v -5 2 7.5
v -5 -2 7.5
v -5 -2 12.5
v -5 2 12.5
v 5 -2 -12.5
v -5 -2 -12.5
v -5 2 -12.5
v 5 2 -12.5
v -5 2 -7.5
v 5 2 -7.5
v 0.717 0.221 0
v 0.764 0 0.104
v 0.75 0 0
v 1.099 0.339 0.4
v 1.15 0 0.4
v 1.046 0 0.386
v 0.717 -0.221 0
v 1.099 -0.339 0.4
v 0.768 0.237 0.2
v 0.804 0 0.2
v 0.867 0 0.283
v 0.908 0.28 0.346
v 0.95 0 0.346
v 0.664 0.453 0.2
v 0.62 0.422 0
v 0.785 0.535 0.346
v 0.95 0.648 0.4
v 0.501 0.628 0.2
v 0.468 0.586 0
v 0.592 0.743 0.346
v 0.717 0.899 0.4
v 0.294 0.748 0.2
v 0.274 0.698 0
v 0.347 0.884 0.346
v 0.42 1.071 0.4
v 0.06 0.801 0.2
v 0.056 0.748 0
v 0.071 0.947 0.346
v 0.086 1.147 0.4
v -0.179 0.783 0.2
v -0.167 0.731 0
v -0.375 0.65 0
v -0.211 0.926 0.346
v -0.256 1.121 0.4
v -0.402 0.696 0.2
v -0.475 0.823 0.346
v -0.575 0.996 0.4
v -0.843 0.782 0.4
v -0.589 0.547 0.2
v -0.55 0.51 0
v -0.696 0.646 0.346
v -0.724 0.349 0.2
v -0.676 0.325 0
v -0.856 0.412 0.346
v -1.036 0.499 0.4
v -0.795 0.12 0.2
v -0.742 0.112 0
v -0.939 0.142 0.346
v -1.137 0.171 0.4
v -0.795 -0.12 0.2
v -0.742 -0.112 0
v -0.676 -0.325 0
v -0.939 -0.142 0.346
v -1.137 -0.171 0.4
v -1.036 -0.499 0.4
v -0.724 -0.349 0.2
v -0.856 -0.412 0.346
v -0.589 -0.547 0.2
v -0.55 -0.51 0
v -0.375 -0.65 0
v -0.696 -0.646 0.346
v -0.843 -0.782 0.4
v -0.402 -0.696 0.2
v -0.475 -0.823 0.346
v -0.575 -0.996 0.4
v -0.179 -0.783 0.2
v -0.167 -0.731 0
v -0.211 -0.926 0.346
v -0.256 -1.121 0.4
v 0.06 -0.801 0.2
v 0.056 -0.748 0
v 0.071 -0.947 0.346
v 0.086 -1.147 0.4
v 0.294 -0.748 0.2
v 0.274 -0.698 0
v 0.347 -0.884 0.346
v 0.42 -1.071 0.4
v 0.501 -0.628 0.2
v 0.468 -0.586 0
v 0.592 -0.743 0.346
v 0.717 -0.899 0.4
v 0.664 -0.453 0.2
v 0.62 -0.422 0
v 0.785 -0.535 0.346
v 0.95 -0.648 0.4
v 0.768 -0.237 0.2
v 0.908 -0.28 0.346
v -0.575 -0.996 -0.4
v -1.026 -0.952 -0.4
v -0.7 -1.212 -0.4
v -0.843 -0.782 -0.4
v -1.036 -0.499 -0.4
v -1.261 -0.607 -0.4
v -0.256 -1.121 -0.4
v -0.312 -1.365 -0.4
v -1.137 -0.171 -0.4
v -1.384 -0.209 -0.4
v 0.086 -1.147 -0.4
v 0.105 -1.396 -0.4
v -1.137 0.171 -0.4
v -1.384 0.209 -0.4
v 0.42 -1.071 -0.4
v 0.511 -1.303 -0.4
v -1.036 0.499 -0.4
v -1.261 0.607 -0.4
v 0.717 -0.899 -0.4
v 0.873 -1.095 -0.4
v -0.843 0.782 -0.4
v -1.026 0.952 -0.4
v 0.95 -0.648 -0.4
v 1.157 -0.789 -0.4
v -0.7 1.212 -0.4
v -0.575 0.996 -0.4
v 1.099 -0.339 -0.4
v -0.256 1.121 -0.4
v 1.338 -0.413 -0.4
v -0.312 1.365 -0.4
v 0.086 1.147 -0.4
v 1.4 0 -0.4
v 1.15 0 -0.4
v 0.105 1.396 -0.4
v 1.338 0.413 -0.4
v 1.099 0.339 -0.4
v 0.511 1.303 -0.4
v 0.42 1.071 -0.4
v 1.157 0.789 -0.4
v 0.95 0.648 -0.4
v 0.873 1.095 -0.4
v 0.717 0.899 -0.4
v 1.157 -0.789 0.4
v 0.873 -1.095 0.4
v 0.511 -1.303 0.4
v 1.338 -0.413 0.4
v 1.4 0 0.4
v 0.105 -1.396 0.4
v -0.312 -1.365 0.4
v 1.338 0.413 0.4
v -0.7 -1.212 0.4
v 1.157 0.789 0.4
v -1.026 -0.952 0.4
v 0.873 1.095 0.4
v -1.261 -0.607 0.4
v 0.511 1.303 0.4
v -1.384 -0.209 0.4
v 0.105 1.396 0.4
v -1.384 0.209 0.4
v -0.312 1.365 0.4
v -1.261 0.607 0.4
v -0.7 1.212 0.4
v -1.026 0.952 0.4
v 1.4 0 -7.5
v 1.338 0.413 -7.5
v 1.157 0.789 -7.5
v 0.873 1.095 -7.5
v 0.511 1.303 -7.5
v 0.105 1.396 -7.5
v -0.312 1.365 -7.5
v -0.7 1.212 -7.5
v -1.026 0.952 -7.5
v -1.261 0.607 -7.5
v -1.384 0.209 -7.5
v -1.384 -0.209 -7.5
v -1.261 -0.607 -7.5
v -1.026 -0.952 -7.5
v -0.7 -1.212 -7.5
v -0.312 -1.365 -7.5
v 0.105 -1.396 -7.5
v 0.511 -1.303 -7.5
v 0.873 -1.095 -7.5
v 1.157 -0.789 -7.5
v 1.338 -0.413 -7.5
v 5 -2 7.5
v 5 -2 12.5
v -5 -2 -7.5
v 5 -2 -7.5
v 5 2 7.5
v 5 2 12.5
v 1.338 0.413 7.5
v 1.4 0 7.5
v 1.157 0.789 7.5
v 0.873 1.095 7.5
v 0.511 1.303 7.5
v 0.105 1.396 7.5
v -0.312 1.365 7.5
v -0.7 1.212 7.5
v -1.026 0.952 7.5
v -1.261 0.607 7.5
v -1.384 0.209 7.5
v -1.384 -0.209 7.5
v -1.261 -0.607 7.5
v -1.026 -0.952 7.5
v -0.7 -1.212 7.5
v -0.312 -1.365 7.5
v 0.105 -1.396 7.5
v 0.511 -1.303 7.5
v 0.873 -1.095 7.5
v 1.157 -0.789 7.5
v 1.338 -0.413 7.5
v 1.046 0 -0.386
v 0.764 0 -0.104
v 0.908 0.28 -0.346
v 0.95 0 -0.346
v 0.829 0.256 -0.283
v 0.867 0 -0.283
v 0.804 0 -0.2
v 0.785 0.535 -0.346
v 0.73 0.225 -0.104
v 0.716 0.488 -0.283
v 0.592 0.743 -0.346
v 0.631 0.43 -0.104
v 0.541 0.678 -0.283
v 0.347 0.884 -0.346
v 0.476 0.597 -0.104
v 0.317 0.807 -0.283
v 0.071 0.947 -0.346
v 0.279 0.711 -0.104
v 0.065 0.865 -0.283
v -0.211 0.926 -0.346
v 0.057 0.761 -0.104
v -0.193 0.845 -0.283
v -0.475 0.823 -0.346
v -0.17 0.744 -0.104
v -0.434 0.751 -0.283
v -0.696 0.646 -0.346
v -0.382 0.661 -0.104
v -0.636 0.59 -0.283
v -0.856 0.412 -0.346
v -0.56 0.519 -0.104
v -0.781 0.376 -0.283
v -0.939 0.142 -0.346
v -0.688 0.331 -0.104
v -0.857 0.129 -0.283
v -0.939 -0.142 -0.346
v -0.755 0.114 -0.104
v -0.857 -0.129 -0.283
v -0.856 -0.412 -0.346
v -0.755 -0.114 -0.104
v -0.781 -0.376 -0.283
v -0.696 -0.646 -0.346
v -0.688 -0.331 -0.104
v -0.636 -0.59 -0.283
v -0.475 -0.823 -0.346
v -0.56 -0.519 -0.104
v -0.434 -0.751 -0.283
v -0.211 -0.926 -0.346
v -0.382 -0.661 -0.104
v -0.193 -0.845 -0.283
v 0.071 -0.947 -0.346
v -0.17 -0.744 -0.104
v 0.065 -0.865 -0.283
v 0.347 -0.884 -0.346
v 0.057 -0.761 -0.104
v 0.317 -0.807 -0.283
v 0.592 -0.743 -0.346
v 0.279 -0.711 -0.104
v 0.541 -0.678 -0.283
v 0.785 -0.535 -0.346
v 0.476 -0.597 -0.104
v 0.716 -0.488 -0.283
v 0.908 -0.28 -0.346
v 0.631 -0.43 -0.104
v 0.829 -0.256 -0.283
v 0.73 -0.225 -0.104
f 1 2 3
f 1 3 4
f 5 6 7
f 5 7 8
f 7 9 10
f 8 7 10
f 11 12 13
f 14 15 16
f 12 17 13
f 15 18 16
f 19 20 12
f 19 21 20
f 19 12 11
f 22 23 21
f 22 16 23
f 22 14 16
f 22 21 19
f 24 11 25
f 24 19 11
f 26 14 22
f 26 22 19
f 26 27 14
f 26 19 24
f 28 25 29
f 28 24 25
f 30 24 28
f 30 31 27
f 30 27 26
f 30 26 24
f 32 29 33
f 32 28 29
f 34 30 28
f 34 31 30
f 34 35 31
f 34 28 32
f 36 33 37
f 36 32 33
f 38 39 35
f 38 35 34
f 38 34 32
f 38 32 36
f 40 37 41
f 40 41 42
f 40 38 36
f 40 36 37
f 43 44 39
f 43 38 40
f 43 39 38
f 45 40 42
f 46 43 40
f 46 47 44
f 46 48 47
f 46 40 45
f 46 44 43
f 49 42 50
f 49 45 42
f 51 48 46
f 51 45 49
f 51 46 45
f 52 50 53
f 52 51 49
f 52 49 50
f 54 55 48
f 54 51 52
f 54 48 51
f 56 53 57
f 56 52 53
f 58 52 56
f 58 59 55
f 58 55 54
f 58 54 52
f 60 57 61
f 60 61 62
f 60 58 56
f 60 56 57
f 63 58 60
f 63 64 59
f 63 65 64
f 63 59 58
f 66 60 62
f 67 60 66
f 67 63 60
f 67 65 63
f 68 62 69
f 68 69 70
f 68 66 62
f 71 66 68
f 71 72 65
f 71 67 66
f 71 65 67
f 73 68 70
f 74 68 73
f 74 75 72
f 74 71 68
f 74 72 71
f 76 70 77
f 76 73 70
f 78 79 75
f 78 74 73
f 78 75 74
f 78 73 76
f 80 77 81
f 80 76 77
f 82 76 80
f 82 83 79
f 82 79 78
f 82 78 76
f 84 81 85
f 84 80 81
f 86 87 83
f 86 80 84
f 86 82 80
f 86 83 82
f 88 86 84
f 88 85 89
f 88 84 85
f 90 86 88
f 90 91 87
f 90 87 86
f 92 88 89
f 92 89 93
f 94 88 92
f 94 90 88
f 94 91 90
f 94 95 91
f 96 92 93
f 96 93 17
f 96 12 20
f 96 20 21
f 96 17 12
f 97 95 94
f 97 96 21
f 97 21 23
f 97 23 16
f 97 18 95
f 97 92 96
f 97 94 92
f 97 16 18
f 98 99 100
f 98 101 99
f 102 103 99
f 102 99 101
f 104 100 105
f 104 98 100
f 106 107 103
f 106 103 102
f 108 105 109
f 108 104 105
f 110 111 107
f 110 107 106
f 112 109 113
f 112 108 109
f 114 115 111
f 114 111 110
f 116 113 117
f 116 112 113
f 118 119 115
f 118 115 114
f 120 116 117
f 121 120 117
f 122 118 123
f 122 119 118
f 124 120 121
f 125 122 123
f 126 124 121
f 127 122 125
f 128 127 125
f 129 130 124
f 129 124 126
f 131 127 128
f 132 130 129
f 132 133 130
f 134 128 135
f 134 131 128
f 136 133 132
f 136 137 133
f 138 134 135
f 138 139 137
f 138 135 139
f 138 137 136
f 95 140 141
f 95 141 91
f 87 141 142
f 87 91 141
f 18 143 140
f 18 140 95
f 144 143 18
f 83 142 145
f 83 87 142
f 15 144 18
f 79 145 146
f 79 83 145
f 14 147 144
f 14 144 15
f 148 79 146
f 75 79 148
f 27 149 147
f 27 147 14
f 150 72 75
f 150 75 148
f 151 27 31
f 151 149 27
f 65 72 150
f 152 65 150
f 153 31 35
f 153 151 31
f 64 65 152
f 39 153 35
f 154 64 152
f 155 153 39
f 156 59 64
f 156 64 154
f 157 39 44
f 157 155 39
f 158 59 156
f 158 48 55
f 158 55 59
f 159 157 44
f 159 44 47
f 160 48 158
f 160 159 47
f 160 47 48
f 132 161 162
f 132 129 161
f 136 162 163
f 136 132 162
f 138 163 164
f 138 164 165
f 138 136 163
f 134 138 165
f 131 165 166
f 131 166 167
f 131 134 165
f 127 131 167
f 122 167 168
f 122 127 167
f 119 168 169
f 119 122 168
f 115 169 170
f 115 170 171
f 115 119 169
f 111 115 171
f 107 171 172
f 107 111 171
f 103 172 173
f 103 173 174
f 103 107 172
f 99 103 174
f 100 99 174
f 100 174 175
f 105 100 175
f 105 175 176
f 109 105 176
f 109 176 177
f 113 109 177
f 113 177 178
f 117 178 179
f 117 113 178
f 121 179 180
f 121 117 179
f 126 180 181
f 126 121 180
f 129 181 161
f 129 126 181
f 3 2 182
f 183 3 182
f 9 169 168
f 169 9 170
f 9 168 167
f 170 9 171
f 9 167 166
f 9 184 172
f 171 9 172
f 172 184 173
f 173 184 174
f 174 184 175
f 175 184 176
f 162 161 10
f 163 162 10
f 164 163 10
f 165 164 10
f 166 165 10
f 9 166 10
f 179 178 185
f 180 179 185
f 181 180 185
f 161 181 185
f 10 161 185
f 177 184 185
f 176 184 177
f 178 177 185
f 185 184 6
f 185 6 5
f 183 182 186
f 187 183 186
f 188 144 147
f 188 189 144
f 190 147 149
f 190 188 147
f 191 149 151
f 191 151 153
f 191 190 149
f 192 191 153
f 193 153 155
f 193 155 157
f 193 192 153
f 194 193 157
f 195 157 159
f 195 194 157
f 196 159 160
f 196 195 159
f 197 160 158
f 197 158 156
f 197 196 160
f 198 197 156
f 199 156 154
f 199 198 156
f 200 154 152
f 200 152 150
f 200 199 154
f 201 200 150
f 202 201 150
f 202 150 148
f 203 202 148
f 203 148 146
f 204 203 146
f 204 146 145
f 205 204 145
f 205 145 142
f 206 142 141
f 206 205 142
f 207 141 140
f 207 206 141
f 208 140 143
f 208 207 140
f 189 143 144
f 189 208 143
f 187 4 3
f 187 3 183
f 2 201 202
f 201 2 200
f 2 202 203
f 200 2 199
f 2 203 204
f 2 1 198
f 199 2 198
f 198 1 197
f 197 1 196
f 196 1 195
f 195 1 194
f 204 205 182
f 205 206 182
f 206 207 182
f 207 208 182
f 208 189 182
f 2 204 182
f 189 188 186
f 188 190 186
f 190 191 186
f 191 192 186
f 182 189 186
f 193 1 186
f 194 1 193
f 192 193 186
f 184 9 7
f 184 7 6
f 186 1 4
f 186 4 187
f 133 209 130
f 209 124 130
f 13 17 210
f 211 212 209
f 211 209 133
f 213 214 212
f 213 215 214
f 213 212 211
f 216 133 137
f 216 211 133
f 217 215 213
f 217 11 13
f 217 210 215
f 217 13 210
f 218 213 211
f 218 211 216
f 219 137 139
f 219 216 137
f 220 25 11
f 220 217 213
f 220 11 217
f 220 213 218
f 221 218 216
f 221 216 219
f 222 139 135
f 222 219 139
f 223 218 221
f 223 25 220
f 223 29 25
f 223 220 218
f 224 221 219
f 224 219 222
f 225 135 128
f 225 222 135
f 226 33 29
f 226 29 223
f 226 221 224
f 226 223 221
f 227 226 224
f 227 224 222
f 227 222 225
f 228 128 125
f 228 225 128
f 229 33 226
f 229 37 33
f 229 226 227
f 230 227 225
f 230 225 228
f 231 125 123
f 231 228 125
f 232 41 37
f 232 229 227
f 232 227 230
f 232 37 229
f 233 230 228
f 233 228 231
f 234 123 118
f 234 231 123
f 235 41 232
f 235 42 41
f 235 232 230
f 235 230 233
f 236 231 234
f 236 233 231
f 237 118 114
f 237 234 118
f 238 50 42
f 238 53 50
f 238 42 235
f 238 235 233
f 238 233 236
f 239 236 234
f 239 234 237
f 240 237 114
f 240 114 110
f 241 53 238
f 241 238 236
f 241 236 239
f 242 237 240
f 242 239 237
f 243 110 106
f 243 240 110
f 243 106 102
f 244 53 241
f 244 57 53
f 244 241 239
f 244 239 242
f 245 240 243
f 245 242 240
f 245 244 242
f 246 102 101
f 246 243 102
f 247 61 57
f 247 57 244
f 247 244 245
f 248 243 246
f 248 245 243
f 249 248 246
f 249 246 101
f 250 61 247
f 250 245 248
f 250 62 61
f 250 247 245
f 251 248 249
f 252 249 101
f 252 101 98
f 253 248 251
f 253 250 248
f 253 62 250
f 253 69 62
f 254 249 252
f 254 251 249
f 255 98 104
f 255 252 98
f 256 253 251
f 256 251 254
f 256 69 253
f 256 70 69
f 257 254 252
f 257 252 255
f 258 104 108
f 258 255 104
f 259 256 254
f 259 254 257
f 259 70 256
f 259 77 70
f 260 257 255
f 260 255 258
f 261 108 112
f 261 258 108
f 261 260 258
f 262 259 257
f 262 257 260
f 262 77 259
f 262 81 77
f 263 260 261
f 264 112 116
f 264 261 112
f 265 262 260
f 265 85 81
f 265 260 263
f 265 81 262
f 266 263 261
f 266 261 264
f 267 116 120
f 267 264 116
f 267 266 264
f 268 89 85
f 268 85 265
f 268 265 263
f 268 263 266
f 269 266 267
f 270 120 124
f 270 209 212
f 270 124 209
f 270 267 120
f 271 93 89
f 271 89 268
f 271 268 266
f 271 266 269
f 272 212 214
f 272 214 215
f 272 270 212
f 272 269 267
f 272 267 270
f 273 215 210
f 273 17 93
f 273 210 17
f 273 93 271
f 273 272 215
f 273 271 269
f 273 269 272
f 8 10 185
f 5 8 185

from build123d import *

# Parameters (mm, degrees)
F2_W     = 10
F2_H     = 4
F2_R     = 1.4
F3_DEPTH = 5
F4_W     = 10
F4_H     = 4
F4_R     = 1.4
F5_DEPTH = 5


with BuildPart() as f1:
    # F0 (on Front) → F1 (revolve)
    with BuildSketch(Plane.XZ):
        with BuildLine():
            Line((1.4, 7.5), (0, 7.5))
            Line((0, 7.5), (0, 0))
            Line((0, 0), (0, -7.5))
            Line((0, -7.5), (1.4, -7.5))
            Line((1.4, -7.5), (1.4, -0.4))
            Line((1.4, -0.4), (1.15, -0.4))
            ThreePointArc((1.15, -0.4), (0.8671572875, -0.2828427125), (0.75, 0))
            ThreePointArc((0.75, 0), (0.8671572875, 0.2828427125), (1.15, 0.4))
            Line((1.15, 0.4), (1.4, 0.4))
            Line((1.4, 0.4), (1.4, 7.5))
        make_face()
    revolve(axis=Axis((0, 0, 3.75), (0, 0, 1)))

    # F2 (on face) → F3 (join)
    with BuildSketch(Plane.XY.offset(7.5)):
        Rectangle(F2_W, F2_H)
        Circle(F2_R, mode=Mode.SUBTRACT)
        Circle(F2_R)
    extrude(amount=F3_DEPTH)

    # F4 (on face) → F5 (join)
    with BuildSketch(Plane(origin=(0, 0, -7.5), x_dir=(1, 0, 0), z_dir=(0, 0, -1))):
        Rectangle(F4_W, F4_H)
        Circle(F4_R, mode=Mode.SUBTRACT)
        Circle(F4_R)
    extrude(amount=F5_DEPTH)


solid = f1.part
